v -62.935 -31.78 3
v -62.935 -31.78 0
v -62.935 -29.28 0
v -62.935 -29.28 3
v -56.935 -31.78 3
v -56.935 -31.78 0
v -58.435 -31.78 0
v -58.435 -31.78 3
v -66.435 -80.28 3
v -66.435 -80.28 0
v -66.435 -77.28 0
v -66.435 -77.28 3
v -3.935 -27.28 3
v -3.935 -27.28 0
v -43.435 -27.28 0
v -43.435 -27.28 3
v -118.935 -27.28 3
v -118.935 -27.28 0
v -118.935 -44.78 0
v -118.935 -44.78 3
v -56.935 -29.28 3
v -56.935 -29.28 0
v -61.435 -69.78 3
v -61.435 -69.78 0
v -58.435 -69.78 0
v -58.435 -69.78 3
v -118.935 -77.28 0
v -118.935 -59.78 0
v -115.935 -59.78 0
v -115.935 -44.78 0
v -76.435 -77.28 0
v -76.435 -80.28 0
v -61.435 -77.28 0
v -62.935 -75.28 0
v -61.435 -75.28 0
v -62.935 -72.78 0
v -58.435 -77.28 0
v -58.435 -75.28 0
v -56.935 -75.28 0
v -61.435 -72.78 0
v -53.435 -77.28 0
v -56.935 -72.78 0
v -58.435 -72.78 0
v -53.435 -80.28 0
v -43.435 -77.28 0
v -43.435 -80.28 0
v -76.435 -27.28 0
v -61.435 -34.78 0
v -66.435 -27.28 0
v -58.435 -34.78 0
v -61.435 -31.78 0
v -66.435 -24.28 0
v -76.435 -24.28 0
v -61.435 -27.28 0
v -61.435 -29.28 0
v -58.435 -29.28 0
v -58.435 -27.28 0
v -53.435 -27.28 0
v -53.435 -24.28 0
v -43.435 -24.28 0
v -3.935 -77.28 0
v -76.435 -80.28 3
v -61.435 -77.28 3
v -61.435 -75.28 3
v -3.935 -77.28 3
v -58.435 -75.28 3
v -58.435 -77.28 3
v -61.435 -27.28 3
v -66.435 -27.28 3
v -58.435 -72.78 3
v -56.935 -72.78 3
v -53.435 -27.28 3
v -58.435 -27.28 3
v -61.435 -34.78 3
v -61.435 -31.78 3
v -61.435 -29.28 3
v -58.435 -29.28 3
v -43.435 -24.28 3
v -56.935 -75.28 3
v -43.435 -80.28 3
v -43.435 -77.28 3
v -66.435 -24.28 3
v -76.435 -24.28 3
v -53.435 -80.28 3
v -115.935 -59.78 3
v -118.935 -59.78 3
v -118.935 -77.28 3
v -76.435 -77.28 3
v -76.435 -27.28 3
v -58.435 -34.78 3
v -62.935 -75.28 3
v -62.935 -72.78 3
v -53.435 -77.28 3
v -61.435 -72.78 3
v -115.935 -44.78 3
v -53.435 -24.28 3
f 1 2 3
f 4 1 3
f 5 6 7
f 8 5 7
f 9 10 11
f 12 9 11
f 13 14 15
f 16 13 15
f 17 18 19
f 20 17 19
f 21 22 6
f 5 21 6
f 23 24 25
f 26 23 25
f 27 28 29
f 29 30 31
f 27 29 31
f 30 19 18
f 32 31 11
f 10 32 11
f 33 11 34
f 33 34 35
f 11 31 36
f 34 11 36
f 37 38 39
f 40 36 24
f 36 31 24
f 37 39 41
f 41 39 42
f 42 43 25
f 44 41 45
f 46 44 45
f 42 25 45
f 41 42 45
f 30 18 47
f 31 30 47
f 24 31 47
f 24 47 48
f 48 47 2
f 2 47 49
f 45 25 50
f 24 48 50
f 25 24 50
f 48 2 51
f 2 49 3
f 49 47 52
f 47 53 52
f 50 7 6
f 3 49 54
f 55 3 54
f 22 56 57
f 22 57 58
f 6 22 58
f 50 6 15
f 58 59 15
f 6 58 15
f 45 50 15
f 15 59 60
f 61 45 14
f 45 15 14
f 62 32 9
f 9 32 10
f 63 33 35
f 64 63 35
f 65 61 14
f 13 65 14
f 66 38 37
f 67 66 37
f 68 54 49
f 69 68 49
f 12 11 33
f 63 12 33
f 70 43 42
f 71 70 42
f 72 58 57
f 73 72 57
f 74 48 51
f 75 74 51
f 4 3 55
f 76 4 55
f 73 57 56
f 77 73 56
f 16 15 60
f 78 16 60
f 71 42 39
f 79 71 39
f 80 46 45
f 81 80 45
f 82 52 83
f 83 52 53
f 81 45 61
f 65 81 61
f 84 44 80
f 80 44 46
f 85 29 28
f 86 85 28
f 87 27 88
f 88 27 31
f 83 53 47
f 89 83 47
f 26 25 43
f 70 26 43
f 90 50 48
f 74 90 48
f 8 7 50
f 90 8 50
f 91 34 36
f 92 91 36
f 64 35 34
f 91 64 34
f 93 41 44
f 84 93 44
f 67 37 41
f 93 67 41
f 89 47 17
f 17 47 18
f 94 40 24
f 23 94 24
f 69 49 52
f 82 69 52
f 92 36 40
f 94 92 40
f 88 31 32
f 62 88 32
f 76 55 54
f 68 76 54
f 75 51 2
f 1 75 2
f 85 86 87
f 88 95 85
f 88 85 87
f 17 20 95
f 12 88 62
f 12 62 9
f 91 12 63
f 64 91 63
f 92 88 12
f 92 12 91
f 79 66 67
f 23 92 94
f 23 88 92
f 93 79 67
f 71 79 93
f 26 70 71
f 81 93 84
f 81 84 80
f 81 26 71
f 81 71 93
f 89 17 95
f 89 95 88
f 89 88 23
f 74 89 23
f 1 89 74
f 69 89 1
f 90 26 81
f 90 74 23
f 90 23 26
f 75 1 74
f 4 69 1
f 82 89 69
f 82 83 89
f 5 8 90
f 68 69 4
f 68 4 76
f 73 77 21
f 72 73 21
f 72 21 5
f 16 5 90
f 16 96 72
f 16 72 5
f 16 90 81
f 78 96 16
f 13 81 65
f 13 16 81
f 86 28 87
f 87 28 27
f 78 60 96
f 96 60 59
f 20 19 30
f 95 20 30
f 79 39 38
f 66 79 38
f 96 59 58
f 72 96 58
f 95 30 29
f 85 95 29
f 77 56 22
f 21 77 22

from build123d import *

# Parameters (mm, degrees)
F1_DEPTH = 3


with BuildPart() as f1:
    # F0 (on Top) → F1 (new body)
    with BuildSketch(Plane.XY):
        Polygon((-76.435372, -27.280482), (-118.935372, -27.280482), (-118.935372, -44.780482), (-115.935372, -44.780482), (-115.935372, -59.780482), (-118.935372, -59.780482), (-118.935372, -77.280482), (-76.435372, -77.280482), (-76.435372, -80.280482), (-66.435372, -80.280482), (-66.435372, -77.280482), (-61.435372, -77.280482), (-61.435372, -75.280482), (-62.935372, -75.280482), (-62.935372, -72.780482), (-61.435372, -72.780482), (-61.435372, -69.780482), (-58.435372, -69.780482), (-58.435372, -72.780482), (-56.935372, -72.780482), (-56.935372, -75.280482), (-58.435372, -75.280482), (-58.435372, -77.280482), (-53.435372, -77.280482), (-53.435372, -80.280482), (-43.435372, -80.280482), (-43.435372, -77.280482), (-3.935372, -77.280482), (-3.935372, -27.280482), (-43.435372, -27.280482), (-43.435372, -24.280482), (-53.435372, -24.280482), (-53.435372, -27.280482), (-58.435372, -27.280482), (-58.435372, -29.280482), (-56.935372, -29.280482), (-56.935372, -31.780482), (-58.435372, -31.780482), (-58.435372, -34.780482), (-61.435372, -34.780482), (-61.435372, -31.780482), (-62.935372, -31.780482), (-62.935372, -29.280482), (-61.435372, -29.280482), (-61.435372, -27.280482), (-66.435372, -27.280482), (-66.435372, -24.280482), (-76.435372, -24.280482), align=None)
    extrude(amount=F1_DEPTH)


solid = f1.part
